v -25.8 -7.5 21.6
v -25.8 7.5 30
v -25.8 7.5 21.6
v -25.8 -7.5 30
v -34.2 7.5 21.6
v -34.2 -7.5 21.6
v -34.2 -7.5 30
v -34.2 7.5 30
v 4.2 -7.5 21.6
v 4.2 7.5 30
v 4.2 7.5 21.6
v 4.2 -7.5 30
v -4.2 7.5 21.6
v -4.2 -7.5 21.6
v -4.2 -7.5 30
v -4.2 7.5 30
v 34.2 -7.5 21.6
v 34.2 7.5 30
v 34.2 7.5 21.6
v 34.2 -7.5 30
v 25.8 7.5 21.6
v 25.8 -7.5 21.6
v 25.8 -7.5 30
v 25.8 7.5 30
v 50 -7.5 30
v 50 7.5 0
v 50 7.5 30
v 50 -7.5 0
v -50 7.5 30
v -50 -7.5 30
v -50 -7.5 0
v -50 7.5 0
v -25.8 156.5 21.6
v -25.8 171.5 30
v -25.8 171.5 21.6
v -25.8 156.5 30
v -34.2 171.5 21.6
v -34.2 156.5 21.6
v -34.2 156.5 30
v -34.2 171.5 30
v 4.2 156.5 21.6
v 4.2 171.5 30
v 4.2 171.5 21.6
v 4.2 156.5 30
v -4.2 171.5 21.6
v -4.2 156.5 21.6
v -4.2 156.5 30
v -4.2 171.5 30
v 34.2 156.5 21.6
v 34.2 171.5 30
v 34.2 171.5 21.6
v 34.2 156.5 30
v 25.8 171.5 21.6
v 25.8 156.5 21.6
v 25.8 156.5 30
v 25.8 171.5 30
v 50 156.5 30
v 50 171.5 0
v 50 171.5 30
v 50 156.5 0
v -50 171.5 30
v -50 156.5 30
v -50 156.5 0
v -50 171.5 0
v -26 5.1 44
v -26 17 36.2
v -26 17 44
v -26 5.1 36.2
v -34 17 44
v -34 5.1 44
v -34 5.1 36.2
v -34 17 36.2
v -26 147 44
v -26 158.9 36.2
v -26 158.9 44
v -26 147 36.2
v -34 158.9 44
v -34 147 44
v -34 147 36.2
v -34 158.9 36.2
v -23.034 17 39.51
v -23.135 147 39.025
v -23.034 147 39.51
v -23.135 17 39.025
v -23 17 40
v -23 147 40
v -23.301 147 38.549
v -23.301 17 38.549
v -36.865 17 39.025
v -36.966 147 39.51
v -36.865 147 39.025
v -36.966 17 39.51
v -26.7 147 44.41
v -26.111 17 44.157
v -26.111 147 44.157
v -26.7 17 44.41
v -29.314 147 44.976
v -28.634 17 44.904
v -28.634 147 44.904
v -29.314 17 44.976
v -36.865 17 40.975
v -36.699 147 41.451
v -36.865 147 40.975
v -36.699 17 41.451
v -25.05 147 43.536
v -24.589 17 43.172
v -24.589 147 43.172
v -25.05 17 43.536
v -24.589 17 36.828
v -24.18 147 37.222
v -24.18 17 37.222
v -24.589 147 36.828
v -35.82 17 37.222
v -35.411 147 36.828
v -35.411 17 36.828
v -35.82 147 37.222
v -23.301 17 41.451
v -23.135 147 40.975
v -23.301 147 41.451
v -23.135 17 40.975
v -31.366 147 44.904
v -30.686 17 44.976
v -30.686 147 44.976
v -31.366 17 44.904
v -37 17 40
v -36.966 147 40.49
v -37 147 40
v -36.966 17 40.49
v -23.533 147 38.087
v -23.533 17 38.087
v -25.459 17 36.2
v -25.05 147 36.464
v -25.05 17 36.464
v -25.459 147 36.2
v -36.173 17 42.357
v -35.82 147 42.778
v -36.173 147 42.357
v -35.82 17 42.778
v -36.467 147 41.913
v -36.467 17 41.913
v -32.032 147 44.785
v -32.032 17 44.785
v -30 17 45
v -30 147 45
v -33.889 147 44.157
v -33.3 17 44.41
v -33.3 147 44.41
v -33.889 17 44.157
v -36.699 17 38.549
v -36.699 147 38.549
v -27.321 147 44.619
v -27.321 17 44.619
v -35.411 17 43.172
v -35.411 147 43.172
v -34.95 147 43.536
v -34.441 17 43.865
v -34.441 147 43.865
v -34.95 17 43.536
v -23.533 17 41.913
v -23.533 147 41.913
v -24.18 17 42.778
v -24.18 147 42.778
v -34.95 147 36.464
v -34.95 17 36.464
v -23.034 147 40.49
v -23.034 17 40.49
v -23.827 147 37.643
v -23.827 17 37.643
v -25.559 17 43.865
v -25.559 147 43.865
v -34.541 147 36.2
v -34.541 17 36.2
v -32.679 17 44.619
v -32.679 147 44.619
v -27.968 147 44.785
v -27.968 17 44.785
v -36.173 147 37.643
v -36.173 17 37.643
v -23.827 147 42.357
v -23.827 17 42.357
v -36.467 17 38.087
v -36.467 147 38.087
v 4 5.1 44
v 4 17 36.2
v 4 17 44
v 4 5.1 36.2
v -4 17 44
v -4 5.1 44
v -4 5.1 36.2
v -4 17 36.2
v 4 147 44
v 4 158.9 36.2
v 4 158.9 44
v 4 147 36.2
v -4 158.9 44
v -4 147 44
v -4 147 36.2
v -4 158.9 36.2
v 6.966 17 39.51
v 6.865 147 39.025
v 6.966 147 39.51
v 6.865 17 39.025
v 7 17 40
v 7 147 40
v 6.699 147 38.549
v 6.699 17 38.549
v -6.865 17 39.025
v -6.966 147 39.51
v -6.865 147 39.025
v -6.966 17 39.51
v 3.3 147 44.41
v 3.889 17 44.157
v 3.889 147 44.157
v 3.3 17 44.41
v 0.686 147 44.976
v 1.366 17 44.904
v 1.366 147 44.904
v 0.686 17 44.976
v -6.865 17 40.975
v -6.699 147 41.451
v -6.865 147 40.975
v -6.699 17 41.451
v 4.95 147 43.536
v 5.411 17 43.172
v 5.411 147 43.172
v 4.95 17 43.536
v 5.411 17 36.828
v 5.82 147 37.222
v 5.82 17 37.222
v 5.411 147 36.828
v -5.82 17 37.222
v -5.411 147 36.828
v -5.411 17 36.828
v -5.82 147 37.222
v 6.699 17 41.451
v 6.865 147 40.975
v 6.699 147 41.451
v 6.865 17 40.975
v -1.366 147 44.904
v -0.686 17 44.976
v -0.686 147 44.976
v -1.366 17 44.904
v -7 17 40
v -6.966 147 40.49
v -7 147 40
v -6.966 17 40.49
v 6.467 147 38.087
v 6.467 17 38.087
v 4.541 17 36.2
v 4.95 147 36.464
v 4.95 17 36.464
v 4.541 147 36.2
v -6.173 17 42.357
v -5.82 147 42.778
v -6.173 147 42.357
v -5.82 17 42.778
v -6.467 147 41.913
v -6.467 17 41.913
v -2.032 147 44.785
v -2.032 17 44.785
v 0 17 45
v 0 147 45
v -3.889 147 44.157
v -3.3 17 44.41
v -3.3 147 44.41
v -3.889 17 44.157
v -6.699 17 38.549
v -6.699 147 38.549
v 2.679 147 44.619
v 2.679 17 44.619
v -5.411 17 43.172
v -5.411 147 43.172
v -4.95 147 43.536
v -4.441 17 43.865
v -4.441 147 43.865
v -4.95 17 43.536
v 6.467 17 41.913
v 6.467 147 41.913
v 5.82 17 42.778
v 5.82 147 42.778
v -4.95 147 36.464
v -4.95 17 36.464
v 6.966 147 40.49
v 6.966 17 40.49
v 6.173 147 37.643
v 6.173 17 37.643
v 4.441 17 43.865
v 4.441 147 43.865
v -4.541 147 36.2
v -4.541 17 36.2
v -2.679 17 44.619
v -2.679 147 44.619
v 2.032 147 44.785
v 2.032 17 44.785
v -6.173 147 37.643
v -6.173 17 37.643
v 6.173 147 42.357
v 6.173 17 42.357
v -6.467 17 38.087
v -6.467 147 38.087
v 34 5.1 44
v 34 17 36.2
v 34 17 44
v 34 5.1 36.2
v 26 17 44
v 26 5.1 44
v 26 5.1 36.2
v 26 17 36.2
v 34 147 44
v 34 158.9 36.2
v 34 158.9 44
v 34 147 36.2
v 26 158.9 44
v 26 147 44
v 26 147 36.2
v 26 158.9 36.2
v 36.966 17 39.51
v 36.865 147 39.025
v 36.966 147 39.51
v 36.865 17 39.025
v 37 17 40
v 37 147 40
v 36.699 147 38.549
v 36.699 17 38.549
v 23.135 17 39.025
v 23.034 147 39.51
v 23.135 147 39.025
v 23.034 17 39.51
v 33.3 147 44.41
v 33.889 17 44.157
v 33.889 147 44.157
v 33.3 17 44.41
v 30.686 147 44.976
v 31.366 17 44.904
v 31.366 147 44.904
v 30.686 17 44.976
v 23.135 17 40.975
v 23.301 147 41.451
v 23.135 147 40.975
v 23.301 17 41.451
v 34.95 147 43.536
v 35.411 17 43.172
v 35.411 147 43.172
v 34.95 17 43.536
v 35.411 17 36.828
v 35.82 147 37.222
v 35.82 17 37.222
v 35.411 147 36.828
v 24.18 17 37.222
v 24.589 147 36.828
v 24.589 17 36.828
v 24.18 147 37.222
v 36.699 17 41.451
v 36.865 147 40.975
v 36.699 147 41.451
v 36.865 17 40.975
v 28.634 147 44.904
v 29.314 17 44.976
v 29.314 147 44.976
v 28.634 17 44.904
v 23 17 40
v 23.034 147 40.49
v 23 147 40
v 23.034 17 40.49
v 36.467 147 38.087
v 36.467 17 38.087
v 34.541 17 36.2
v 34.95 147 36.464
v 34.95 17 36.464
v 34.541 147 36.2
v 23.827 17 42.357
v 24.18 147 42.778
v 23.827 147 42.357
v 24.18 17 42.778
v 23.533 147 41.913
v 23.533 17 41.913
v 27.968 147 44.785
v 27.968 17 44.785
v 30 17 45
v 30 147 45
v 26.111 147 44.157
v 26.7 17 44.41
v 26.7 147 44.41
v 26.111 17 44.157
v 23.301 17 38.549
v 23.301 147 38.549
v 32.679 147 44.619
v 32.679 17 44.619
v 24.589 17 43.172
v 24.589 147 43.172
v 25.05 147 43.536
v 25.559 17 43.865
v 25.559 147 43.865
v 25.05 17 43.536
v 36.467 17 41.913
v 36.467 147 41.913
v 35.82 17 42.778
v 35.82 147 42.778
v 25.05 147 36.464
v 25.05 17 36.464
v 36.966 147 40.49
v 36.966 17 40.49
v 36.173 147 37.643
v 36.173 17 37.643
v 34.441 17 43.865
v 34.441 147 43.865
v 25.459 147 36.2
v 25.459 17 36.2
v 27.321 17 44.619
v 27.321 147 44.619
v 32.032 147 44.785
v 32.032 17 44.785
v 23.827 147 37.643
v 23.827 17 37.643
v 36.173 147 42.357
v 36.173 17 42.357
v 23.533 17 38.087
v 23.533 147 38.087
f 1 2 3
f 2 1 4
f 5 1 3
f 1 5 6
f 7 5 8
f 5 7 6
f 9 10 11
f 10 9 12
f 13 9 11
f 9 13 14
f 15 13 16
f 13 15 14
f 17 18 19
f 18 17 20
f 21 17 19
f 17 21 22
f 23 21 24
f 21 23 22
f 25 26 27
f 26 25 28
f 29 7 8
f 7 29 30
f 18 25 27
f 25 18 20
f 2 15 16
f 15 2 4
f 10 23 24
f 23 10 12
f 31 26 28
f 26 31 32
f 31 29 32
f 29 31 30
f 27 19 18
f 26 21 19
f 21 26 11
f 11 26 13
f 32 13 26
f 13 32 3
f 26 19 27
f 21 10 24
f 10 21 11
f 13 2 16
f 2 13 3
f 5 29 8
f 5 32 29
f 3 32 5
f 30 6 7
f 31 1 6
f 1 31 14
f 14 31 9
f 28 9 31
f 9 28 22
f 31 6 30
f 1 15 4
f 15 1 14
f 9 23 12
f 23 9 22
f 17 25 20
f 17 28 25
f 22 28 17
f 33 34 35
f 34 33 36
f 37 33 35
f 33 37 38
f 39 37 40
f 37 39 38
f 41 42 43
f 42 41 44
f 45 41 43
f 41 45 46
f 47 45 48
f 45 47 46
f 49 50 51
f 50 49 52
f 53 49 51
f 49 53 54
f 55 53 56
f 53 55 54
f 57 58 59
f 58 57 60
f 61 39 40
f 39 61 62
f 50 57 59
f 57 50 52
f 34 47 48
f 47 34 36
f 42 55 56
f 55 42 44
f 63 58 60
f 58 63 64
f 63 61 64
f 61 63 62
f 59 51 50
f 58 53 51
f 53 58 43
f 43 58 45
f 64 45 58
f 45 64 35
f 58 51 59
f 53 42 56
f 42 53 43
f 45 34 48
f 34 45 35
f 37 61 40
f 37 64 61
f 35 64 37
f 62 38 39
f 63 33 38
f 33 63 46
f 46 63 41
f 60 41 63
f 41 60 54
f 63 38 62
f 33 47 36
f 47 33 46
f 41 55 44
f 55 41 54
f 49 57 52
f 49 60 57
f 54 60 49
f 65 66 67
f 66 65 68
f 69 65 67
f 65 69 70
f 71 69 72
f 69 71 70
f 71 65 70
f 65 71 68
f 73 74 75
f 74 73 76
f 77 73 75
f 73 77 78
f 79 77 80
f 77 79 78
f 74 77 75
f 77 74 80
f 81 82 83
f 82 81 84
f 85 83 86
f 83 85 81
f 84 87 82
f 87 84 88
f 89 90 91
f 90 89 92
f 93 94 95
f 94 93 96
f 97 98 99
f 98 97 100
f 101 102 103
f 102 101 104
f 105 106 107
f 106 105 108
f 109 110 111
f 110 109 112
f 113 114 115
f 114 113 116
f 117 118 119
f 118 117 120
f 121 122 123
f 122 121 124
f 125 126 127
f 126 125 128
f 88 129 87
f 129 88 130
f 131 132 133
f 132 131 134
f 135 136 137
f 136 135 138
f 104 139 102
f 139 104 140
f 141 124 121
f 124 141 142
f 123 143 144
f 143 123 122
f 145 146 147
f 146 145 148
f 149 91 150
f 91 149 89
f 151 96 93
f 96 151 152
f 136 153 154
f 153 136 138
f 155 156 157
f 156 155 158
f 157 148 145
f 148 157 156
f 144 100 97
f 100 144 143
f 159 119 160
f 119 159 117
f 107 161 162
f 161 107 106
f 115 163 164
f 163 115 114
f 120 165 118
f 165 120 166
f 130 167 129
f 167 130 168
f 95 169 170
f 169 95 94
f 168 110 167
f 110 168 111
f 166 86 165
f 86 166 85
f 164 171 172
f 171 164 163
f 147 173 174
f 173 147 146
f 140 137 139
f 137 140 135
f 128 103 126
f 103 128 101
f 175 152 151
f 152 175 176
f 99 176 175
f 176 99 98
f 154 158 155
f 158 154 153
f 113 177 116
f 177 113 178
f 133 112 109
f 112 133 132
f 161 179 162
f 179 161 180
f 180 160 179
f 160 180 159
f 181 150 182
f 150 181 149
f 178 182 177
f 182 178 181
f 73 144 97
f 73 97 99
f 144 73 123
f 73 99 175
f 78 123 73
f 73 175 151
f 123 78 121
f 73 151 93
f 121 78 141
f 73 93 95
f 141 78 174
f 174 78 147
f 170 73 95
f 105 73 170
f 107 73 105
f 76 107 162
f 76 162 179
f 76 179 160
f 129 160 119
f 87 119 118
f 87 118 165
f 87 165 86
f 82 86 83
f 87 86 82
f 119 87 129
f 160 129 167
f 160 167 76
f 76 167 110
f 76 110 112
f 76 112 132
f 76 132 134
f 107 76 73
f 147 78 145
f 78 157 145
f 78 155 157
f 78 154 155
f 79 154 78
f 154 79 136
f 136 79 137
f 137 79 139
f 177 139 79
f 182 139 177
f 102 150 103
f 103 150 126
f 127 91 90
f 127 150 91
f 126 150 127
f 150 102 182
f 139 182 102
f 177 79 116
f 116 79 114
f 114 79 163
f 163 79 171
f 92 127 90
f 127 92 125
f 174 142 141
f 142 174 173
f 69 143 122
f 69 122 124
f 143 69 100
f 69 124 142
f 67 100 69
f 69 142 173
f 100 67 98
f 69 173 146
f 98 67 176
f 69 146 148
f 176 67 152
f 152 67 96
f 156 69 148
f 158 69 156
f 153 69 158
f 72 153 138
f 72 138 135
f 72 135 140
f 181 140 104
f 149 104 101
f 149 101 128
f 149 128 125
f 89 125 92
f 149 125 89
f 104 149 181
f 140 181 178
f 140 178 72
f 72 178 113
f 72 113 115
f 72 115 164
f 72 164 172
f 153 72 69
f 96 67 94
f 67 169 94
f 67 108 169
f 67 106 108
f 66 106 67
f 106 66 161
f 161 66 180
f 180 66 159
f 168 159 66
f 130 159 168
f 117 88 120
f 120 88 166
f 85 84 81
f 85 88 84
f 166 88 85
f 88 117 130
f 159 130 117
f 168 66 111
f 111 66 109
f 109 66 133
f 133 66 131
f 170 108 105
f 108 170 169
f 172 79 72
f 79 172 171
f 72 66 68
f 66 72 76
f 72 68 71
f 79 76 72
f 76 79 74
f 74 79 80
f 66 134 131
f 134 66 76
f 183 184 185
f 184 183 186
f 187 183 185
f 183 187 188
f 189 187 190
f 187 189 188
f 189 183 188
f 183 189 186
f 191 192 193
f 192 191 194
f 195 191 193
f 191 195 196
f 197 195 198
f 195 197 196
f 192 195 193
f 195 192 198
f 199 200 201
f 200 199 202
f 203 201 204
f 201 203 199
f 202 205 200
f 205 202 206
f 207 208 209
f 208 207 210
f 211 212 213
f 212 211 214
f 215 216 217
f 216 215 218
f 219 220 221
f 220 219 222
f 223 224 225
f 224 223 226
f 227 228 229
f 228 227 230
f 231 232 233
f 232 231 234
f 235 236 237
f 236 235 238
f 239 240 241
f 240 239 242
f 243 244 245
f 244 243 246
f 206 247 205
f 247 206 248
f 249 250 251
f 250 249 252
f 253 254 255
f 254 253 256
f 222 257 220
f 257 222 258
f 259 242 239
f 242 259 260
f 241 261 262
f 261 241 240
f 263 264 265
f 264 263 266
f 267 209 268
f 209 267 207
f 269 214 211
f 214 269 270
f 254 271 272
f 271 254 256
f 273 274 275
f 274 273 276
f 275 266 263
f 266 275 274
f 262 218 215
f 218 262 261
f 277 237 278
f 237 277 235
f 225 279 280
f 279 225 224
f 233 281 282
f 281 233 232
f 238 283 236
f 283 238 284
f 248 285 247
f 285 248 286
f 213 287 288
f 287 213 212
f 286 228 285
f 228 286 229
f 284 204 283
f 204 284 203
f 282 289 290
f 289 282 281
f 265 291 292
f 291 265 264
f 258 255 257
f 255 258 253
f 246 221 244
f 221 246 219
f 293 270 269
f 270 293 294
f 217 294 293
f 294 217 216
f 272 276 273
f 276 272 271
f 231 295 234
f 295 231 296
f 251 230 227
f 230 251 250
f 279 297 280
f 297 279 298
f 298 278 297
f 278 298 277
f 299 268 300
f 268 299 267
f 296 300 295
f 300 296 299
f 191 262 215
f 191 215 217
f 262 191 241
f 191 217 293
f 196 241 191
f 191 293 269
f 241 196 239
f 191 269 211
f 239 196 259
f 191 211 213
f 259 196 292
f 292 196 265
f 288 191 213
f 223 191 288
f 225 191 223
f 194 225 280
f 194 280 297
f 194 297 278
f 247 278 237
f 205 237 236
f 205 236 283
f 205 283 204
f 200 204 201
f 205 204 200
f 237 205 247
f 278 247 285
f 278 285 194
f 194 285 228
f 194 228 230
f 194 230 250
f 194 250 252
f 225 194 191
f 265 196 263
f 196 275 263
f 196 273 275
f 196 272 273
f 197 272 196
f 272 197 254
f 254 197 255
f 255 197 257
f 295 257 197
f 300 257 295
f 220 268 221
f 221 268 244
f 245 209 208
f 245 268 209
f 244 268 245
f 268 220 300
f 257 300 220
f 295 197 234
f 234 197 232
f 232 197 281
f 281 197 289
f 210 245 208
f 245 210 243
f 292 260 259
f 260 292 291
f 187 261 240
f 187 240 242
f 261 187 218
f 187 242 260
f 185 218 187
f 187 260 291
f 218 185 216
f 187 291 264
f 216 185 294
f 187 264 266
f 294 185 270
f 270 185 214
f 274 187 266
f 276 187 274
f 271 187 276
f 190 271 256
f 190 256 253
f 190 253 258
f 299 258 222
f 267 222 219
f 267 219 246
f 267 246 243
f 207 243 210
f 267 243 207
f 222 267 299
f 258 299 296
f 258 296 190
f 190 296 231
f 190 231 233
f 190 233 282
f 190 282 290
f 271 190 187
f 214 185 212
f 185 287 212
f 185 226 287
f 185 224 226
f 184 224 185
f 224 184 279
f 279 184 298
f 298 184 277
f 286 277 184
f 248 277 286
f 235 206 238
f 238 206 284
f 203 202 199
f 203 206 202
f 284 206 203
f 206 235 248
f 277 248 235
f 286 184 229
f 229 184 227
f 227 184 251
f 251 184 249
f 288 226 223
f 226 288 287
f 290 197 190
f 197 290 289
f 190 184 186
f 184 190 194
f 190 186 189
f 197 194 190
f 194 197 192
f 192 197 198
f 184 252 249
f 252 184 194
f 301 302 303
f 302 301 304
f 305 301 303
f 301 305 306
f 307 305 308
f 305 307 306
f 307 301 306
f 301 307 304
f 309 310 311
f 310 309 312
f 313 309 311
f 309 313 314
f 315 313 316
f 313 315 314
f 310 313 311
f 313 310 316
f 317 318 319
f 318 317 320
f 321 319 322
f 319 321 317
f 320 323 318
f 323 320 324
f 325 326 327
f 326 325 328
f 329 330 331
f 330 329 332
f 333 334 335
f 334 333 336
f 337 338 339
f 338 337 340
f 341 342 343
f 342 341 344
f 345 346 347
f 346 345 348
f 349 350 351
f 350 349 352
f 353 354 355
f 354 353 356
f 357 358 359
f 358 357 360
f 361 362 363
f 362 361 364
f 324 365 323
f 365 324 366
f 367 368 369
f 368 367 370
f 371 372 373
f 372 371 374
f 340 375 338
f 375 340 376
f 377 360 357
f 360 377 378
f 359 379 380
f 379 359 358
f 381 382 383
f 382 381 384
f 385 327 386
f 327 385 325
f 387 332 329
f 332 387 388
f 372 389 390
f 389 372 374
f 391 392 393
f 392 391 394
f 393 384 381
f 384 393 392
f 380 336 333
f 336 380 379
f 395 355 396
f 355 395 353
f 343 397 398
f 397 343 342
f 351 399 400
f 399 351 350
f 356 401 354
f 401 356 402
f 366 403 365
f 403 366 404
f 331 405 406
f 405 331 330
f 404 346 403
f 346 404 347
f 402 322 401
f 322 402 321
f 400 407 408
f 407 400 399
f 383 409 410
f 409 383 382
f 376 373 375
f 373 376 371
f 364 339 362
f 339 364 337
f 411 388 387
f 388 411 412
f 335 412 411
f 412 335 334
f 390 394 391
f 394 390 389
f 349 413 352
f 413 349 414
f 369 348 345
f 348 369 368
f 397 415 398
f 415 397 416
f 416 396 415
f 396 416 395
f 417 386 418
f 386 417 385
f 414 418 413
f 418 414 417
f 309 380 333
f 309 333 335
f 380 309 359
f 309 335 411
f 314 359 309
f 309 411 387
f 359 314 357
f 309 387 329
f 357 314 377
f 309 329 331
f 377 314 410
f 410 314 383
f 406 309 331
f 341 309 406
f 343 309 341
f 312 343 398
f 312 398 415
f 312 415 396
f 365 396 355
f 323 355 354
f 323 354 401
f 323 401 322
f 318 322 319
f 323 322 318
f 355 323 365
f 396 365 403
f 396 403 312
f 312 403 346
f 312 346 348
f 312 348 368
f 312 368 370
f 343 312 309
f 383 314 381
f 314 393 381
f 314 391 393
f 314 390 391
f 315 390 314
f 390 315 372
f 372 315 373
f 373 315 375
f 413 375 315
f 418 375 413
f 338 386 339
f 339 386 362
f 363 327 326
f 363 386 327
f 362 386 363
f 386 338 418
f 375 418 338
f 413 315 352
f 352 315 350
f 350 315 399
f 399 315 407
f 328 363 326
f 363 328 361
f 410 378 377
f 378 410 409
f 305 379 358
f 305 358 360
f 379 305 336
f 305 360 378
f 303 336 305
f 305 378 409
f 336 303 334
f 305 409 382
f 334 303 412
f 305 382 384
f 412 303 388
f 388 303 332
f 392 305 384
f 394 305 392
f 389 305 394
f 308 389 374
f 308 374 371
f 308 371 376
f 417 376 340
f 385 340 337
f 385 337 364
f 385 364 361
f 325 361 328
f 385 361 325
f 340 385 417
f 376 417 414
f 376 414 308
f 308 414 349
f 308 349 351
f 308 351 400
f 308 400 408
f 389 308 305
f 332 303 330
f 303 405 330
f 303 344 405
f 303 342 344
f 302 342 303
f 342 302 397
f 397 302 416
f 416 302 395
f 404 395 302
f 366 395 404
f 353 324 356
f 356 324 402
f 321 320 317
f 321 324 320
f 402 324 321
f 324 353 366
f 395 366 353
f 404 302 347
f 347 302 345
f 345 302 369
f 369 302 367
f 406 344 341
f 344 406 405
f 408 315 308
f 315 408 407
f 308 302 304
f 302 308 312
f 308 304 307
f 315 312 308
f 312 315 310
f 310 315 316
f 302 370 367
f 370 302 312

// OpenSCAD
// Rib frame for needle decompression and finger thoracostomy training
// Three-part print: two rails and three elliptical rib bars that press-fit
// into the rails. The space under the ribs stays open, so a needle or finger
// that clears the rib passes into free air ("pleural space"). Cover the top
// with 15-20 mm of foam, gelatin, or pork belly as the chest wall.
//
// Teaching geometry: ribs 14 mm wide with 16 mm intercostal gaps; insert
// over the superior border of the rib, as taught, to avoid the
// "neurovascular bundle" on each rib's inferior edge.
//
// Prints flat, no supports. PLA, 3 perimeters. part = "rail", "rib", "all".

$fn = 64;

part        = "all";
rib_len     = 130;
rib_w       = 14;    // ellipse width
rib_h       = 10;    // ellipse height
rib_pitch   = 30;    // center-to-center spacing -> 16 mm gap
n_ribs      = 3;
peg         = 8;     // square peg on rib ends
peg_len     = 12;
rail_l      = 100;
rail_w      = 15;
rail_h      = 30;
clear       = 0.4;   // press-fit clearance

module rib() {
    // elliptical bar with pegs; flat strip cut on the bottom for bed adhesion
    difference() {
        union() {
            rotate([-90, 0, 0])
                scale([rib_w / rib_h, 1, 1])
                    cylinder(d = rib_h, h = rib_len, center = false);
            for (y = [-peg_len + 0.1, rib_len - 0.1])
                translate([-peg/2, y, -peg/2]) cube([peg, peg_len, peg]);
        }
        translate([-rib_w, -peg_len - 1, -rib_h/2 - 10])
            cube([rib_w * 2, rib_len + 2 * peg_len + 2, 10 + 1.2]);
    }
}

module rail() {
    difference() {
        translate([-rail_l/2, -rail_w/2, 0]) cube([rail_l, rail_w, rail_h]);
        // peg slots, open at the top
        for (i = [0 : n_ribs - 1])
            translate([(i - (n_ribs - 1)/2) * rib_pitch - (peg + clear)/2,
                       -rail_w/2 - 1,
                       rail_h - peg - clear])
                cube([peg + clear, rail_w + 2, peg + clear + 1]);
    }
}

if (part == "rail") rail();
else if (part == "rib") rib();
else {
    // assembled preview / plate layout
    translate([0, 0, 0]) rail();
    translate([0, rib_len + 2 * peg_len + 10, 0]) rail();
    for (i = [0 : n_ribs - 1])
        translate([(i - (n_ribs - 1)/2) * rib_pitch, peg_len + 5, rib_h/2 + rail_h + 5])
            rib();
}
